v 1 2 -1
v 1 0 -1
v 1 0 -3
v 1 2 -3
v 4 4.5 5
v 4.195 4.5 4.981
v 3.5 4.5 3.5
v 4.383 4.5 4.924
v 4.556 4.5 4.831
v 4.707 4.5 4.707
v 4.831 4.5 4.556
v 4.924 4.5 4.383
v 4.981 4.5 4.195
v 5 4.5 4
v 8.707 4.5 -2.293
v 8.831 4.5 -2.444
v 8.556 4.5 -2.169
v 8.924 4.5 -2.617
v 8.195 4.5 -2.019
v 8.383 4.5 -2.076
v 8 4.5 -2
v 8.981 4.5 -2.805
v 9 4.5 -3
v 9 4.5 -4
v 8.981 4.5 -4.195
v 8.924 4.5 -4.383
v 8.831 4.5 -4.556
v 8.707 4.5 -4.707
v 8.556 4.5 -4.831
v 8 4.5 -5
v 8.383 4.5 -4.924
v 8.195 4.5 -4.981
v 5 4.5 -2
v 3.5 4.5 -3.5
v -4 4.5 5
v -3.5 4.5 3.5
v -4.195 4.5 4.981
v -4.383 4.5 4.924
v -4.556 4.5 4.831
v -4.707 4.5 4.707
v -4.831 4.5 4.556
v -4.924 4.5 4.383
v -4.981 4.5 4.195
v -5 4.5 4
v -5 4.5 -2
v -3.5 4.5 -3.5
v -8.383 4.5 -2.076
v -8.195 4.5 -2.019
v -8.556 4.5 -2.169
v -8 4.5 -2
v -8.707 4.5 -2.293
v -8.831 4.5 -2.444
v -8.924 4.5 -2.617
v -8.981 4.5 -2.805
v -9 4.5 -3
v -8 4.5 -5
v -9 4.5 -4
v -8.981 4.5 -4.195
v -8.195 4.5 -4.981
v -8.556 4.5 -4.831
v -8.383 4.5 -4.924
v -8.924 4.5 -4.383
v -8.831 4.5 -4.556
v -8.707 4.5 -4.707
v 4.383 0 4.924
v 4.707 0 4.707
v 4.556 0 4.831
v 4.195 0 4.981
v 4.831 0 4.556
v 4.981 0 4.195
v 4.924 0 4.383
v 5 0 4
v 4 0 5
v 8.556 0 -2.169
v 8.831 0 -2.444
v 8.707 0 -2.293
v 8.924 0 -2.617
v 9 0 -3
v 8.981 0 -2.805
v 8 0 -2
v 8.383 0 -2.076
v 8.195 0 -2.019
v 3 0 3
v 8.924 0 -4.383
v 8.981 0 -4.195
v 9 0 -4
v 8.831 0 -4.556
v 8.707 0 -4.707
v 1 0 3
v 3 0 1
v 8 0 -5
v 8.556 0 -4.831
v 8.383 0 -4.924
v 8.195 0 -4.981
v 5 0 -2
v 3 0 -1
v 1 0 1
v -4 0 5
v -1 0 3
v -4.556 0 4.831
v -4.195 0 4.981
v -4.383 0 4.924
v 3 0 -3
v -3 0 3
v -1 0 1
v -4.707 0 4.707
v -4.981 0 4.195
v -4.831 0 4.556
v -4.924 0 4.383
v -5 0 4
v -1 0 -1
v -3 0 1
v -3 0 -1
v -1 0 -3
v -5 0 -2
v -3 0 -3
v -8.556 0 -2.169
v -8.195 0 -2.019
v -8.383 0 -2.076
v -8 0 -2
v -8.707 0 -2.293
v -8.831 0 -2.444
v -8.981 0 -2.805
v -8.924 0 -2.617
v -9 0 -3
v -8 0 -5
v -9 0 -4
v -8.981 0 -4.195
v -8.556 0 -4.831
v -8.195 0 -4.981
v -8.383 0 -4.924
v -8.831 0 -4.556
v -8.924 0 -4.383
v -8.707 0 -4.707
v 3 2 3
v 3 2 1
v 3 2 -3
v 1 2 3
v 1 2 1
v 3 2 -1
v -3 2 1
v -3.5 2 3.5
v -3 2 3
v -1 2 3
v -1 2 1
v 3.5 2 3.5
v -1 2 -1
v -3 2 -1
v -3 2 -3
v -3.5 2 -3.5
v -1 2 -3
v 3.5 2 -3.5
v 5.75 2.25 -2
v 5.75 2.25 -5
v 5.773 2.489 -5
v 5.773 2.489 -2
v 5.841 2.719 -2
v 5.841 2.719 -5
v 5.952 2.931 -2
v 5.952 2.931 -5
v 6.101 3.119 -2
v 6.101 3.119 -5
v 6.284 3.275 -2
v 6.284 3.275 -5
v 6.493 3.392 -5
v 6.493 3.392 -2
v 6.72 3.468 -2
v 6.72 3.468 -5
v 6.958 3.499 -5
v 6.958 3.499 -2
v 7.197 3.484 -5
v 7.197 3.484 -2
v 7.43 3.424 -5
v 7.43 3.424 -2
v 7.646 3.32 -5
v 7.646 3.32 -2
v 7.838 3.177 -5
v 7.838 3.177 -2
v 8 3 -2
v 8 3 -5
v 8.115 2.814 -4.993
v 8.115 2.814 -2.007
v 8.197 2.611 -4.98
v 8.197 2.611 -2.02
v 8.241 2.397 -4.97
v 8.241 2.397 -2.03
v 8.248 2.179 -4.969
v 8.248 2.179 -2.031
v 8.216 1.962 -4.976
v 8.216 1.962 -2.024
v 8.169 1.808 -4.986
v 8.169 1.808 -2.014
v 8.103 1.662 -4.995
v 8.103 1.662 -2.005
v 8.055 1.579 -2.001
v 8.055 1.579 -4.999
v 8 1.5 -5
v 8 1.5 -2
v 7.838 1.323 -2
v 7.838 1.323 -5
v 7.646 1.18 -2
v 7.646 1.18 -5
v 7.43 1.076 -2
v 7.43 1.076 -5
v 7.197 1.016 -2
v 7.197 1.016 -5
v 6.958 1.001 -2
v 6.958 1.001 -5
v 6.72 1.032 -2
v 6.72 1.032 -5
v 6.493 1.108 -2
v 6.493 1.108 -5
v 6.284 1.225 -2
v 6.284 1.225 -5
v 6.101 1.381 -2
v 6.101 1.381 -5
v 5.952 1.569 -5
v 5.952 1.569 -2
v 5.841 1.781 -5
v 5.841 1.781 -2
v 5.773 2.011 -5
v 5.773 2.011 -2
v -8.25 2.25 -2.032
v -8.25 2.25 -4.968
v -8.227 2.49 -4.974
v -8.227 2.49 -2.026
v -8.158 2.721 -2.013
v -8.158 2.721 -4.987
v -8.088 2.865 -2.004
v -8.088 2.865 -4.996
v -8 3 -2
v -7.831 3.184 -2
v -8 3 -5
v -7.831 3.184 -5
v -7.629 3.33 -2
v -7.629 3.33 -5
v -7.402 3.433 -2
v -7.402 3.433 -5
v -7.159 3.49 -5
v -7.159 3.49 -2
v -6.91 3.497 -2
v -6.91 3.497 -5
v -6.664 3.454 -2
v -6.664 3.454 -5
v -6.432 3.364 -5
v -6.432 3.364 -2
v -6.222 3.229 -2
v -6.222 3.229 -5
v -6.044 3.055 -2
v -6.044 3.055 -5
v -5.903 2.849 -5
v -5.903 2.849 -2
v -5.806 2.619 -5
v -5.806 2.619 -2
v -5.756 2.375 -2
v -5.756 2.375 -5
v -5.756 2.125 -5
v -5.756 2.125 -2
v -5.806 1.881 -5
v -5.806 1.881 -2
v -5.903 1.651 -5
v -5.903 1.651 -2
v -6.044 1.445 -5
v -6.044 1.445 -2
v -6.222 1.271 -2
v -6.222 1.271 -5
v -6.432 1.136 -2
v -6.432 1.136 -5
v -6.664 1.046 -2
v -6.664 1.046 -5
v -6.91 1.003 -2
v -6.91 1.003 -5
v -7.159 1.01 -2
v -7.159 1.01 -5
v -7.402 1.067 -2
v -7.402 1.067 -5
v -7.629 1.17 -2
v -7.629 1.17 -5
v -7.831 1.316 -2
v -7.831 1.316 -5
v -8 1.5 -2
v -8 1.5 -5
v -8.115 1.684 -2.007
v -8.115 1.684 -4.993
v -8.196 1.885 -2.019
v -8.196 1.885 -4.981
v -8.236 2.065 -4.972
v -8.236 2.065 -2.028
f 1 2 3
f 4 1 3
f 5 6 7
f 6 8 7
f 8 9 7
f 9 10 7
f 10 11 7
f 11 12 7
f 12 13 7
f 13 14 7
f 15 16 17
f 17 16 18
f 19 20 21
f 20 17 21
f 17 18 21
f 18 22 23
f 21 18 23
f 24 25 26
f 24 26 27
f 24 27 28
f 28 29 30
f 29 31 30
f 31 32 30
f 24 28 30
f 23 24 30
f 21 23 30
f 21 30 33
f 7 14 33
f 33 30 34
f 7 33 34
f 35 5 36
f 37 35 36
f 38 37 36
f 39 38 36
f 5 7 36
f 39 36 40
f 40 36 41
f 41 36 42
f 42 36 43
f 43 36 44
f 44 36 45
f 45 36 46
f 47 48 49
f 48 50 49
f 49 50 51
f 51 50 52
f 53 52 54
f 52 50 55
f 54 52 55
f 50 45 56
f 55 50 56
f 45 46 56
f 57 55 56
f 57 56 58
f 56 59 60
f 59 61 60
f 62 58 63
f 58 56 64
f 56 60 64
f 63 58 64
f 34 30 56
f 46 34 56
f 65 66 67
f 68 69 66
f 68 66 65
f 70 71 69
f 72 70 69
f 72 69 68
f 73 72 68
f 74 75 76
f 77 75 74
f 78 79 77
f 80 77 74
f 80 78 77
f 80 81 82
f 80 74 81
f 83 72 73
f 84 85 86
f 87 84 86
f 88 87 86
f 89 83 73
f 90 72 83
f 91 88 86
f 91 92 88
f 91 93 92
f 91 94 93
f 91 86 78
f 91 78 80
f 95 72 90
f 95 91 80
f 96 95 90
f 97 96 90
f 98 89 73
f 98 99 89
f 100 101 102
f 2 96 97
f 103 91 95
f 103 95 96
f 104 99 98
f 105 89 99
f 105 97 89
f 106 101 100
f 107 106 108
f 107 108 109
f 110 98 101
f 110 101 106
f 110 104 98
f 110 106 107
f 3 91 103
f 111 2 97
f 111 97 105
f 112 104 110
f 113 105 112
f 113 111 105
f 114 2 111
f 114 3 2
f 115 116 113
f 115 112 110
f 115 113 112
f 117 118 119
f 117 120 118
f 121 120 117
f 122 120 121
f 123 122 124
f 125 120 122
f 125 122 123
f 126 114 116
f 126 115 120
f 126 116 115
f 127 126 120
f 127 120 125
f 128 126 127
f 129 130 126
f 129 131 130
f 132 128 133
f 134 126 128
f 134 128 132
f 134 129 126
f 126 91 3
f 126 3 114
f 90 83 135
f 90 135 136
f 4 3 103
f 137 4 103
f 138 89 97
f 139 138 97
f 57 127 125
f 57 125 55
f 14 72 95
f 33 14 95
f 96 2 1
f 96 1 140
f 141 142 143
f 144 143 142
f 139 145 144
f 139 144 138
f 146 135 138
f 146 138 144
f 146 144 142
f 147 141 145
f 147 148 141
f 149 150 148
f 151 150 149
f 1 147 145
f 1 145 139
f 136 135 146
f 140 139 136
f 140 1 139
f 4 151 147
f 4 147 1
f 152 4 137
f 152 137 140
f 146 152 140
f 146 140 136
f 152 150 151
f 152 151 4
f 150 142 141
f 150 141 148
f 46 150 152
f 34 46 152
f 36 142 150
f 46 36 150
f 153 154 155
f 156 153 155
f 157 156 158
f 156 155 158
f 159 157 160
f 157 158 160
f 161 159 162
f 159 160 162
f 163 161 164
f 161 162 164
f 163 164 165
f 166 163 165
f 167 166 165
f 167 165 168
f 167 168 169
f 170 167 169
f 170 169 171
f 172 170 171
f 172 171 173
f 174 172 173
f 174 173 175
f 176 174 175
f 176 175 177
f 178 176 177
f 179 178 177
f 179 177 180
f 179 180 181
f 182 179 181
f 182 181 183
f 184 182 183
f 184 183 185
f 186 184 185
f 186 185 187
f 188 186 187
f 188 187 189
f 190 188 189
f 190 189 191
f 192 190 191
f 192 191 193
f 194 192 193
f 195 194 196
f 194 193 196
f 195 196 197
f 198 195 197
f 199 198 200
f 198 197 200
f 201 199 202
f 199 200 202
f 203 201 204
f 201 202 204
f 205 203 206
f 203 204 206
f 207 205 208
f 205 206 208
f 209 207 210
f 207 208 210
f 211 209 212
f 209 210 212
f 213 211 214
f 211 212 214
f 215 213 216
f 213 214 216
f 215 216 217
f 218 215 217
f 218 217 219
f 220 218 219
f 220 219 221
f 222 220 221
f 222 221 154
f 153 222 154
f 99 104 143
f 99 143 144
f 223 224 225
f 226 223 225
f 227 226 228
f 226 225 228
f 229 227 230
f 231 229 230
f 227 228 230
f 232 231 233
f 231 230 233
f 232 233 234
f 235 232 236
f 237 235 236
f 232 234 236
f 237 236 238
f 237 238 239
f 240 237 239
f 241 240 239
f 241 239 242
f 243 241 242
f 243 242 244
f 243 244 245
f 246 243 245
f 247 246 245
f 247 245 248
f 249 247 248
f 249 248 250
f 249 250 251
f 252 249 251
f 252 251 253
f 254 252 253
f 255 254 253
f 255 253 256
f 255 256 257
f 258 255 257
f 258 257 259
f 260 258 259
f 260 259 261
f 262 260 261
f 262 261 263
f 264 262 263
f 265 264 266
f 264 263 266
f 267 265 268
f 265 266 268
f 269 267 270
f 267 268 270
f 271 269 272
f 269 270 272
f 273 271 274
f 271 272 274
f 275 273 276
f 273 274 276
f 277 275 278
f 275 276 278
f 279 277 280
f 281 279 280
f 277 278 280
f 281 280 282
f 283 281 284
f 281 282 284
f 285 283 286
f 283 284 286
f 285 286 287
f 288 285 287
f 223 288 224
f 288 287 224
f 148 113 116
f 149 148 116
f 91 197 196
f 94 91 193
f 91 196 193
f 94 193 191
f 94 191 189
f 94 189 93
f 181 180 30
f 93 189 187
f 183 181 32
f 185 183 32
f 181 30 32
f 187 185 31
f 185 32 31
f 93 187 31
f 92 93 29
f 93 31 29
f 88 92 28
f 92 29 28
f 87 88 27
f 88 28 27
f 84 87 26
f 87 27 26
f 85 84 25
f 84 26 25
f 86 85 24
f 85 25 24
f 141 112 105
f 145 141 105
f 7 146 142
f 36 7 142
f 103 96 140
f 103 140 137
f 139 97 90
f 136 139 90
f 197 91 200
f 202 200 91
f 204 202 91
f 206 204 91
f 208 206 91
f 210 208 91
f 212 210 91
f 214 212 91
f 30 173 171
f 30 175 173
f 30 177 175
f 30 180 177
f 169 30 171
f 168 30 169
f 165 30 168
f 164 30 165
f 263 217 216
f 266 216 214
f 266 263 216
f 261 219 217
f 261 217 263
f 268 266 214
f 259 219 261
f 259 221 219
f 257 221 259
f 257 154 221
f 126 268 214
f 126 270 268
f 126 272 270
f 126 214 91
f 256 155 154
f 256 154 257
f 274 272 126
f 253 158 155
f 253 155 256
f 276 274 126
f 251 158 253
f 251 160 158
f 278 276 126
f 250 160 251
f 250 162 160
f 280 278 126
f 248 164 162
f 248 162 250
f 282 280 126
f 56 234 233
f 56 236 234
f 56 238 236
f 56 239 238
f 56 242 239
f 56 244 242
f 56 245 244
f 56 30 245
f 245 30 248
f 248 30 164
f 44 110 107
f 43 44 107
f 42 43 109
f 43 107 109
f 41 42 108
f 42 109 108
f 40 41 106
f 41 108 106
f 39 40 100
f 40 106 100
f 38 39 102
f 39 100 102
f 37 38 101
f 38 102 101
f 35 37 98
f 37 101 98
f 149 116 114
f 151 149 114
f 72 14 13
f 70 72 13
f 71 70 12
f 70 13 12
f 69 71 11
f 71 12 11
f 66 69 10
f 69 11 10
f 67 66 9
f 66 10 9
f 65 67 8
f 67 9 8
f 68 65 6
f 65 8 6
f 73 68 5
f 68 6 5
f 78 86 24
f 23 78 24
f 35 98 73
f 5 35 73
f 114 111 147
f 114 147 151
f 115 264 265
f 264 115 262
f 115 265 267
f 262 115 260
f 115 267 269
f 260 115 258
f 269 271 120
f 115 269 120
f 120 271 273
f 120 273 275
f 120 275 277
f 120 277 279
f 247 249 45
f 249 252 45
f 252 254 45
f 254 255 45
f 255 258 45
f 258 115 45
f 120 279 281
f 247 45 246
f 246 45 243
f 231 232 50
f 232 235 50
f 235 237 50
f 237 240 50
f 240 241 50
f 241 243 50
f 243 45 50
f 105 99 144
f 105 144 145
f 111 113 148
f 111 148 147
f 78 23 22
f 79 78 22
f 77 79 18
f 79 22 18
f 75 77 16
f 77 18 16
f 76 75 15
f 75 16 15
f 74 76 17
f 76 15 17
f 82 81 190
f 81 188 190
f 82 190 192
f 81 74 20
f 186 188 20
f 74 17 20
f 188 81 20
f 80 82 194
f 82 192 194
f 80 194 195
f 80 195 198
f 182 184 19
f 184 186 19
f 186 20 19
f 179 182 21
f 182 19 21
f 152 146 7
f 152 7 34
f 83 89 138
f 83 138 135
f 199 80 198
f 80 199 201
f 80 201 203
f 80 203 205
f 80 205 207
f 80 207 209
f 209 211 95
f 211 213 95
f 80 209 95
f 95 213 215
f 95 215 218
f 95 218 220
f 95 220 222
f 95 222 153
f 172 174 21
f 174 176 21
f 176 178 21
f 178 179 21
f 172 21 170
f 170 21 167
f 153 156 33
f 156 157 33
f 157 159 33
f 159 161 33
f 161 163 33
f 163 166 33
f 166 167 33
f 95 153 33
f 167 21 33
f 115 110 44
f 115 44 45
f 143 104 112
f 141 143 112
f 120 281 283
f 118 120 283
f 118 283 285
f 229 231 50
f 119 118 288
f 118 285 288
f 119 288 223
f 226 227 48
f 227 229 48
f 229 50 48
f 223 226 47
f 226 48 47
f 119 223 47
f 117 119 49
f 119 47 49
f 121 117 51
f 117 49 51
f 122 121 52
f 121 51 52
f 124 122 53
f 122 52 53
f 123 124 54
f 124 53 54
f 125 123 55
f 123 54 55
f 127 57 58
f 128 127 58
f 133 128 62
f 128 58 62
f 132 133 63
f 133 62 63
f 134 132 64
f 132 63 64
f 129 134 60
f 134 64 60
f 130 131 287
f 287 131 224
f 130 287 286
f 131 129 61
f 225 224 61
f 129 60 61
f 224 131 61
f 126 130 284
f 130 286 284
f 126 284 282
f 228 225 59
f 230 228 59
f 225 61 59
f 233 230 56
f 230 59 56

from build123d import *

# Parameters (mm, degrees)
ESBO_O1_W                = 10
ESBO_O1_H                = 10
ESBO_O1_W_2              = 2
ESBO_O1_H_2              = 2
RESSALTO_EXTRUS_O1_DEPTH = 2
ESBO_O2_W                = 10
ESBO_O2_H                = 10
RESSALTO_EXTRUS_O2_DEPTH = 2.5
ESBO_O3_W                = 4
ESBO_O3_H                = 4.5
ESBO_O3_R                = 1.25
RESSALTO_EXTRUS_O3_DEPTH = 3
FILETE1_R                = 1


with BuildPart() as part:
    # Esboço1 → Ressalto-extrusão1 (new body)
    with BuildSketch(Plane(origin=(0, 0, 0), x_dir=(1, 0, 0), z_dir=(0, 1, 0))):
        Rectangle(ESBO_O1_W, ESBO_O1_H)
        with Locations((2, 2)):
            Rectangle(ESBO_O1_W_2, ESBO_O1_H_2, mode=Mode.SUBTRACT)
        with Locations((-2, 2)):
            Rectangle(ESBO_O1_W_2, ESBO_O1_H_2, mode=Mode.SUBTRACT)
        with Locations((2, -2)):
            Rectangle(ESBO_O1_W_2, ESBO_O1_H_2, mode=Mode.SUBTRACT)
        with Locations((-2, -2)):
            Rectangle(ESBO_O1_W_2, ESBO_O1_H_2, mode=Mode.SUBTRACT)
    extrude(amount=RESSALTO_EXTRUS_O1_DEPTH)

    # Esboço2 → Ressalto-extrusão2 (add)
    with BuildSketch(Plane(origin=(0, 2, 0), x_dir=(1, 0, 0), z_dir=(0, 1, 0))):
        Rectangle(ESBO_O2_W, ESBO_O2_H)
        Polygon((-1, -3.5), (3.5, -3.5), (3.5, 3.5), (1, 3.5), (-3.5, 3.5), (-3.5, 1), (-3.5, -3.5), align=None, mode=Mode.SUBTRACT)
    extrude(amount=RESSALTO_EXTRUS_O2_DEPTH)

    # Esboço3 → Ressalto-extrusão3 (add)
    # profile 1 of 2: a face of its own
    with BuildSketch(Plane(origin=(0, 0, -5), x_dir=(-1, 0, 0), z_dir=(0, 0, -1))):
        with Locations((-7, 2.25)):
            Rectangle(ESBO_O3_W, ESBO_O3_H)
        with Locations((-7, 2.25)):
            Circle(ESBO_O3_R, mode=Mode.SUBTRACT)
    # profile 2 of 2: a face of its own
    with BuildSketch(Plane(origin=(0, 0, -5), x_dir=(-1, 0, 0), z_dir=(0, 0, -1))):
        with Locations((7, 2.25)):
            Rectangle(ESBO_O3_W, ESBO_O3_H)
        with Locations((7, 2.25)):
            Circle(ESBO_O3_R, mode=Mode.SUBTRACT)
    extrude(amount=-RESSALTO_EXTRUS_O3_DEPTH)

    # Filete1
    # the kernel refuses this fillet: 1 mm, written as the material it takes off along each edge
    with BuildSketch(Plane(origin=(9, 7, -2), x_dir=(-1, 0, 0), z_dir=(0, -1, 0)), Plane(origin=(-9, 7, -5), x_dir=(1, 0, 0), z_dir=(0, -1, 0)), Plane(origin=(5, 7, 5), x_dir=(-1, 0, 0), z_dir=(0, -1, 0))) as filete1_piece_1:
        with BuildLine():
            CenterArc((FILETE1_R, FILETE1_R), FILETE1_R, 180, 90)
            Line((0, FILETE1_R), (0, 0))
            Line((0, 0), (FILETE1_R, 0))
        make_face()
    extrude(amount=9.5, mode=Mode.SUBTRACT)
    with BuildSketch(Plane(origin=(9, 7, -5), x_dir=(-1, 0, 0), z_dir=(0, -1, 0)), Plane(origin=(-9, 7, -2), x_dir=(1, 0, 0), z_dir=(0, -1, 0)), Plane(origin=(-5, -2.5, 5), x_dir=(0, 0, -1), z_dir=(0, 1, 0))) as filete1_piece_2:
        with BuildLine():
            CenterArc((FILETE1_R, -FILETE1_R), FILETE1_R, 90, 90)
            Line((0, -FILETE1_R), (0, 0))
            Line((0, 0), (FILETE1_R, 0))
        make_face()
    extrude(amount=9.5, mode=Mode.SUBTRACT)


solid = part.part
